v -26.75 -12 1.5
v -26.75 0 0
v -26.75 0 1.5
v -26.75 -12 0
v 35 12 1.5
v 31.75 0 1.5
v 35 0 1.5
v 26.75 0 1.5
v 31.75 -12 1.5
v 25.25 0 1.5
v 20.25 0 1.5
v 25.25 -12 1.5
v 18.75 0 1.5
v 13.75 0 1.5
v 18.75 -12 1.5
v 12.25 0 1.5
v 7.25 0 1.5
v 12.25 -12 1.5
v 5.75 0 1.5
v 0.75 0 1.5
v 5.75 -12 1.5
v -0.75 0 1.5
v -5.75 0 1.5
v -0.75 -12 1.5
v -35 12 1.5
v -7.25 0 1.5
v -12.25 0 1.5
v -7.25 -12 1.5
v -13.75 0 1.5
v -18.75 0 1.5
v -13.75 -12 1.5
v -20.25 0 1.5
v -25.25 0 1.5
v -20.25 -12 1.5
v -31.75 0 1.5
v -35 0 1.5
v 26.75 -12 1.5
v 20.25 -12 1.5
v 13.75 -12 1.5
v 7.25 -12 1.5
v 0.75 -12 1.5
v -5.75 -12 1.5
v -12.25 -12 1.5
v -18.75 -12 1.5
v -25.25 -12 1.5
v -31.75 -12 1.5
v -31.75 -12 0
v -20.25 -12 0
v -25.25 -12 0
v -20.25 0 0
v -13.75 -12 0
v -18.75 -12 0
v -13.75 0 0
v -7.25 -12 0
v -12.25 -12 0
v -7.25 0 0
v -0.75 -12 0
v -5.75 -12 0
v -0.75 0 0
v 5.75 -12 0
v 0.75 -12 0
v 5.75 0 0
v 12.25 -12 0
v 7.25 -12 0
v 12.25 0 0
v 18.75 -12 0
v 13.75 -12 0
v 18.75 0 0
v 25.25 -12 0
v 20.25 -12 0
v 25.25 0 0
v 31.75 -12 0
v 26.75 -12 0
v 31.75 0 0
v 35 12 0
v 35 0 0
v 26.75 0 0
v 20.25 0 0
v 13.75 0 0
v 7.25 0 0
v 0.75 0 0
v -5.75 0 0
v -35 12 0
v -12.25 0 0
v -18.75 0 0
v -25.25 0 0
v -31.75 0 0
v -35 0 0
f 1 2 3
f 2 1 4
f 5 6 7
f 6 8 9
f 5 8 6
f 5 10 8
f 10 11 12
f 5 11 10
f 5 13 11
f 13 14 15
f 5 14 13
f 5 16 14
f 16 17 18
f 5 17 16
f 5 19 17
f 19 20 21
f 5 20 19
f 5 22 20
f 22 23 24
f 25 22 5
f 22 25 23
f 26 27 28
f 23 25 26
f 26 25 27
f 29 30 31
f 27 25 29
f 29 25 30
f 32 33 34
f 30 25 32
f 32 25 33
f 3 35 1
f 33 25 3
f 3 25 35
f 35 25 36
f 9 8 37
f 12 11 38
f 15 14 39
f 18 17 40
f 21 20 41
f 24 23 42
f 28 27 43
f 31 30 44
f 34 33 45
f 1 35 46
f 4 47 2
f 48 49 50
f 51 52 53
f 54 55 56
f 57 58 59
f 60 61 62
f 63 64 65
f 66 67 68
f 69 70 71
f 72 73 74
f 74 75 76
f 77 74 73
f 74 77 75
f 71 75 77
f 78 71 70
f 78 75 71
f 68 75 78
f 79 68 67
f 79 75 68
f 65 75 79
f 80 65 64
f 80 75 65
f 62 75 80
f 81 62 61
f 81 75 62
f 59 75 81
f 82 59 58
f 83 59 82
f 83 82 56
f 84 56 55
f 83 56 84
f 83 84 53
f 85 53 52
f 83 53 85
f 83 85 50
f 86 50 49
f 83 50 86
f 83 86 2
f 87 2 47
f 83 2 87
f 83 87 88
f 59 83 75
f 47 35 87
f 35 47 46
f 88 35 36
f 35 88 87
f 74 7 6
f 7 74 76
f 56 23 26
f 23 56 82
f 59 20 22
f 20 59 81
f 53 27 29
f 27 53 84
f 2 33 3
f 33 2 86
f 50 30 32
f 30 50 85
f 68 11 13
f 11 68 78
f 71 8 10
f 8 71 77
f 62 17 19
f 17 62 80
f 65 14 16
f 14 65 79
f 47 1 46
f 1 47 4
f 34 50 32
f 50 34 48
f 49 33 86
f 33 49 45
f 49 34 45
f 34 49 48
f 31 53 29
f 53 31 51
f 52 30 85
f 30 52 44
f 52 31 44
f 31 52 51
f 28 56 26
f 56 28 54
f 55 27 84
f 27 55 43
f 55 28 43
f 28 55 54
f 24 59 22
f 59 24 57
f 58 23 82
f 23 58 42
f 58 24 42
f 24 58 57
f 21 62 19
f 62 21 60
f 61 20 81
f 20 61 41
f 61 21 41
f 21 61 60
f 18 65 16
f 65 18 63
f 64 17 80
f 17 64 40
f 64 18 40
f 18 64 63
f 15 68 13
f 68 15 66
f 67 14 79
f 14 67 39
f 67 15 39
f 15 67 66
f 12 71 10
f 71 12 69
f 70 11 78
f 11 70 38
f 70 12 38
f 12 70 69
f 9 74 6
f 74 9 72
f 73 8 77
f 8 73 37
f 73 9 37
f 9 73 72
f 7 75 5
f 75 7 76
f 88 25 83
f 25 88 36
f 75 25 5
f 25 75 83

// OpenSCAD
// 10-Well Agarose Gel Comb
// Designed for FDM printing, lying flat on the XY plane.

// --- Dimensions ---
plate_length = 70.0;       // X dimension of the spine
plate_width = 12.0;        // Y dimension of the spine
plate_thickness = 1.5;     // Z dimension (height of the plate)

num_teeth = 10;            // Number of teeth
tooth_width = 5.0;         // X dimension of each tooth
tooth_length = 12.0;       // Y dimension of each tooth (extending from spine)
gap_width = 1.5;           // Y dimension of the gap between teeth

// --- Derived Calculations ---
// Total width of the tooth array (from start of first tooth to end of last tooth)
// Total width = (num_teeth * tooth_width) + ((num_teeth - 1) * gap_width)
total_teeth_span = (num_teeth * tooth_width) + ((num_teeth - 1) * gap_width);

// --- Rendering Settings ---
$fn = 64;

// --- Geometry Construction ---

// The user wants a "comb for casting agarose gels".
// In a casting comb, the "teeth" are the solid parts that divide the wells.
// The "wells" are the gaps between the teeth.
// The "spine" is the base plate that holds the teeth.
// The prompt specifies: 
// 1. Spine is 70x12.
// 2. Teeth are 5x12 and hang from one long edge in the -Y direction.
// 3. The row of teeth is centered on the spine in X.

// To ensure the part is a single solid body and matches the bounding box requirements:
// The spine is at Y = [0, 12].
// The teeth hang from the edge at Y = 0, extending to Y = -12.
// Total Y span: -12 to 12 = 24mm.

union() {
    // 1. The Spine (Base Plate)
    // Centered on X and Y. 
    // To have the teeth hang from "one long edge" in -Y, 
    // and the spine to be 12mm wide, we place the spine from Y=0 to Y=12.
    // To center the whole assembly on Y=0, we shift the spine.
    // However, the prompt says "centered on the spine in X".
    // Let's center the spine on X and Y=6 (so the edge is at Y=0).
    // To keep the whole part centered on the origin (0,0) in XY:
    // Spine Y range: [0, 12] -> shifted by -6 -> [-6, 6]
    // Teeth Y range: [-12, 0] -> shifted by -6 -> [-18, -6]
    // Total Y range: [-18, 6] (Size 24).
    
    // Let's re-center the whole assembly so the bounding box is symmetric.
    // Total Y span = plate_width + tooth_length = 12 + 12 = 24.
    // Center of Y = 0. So Y goes from -12 to +12.
    // Spine is at Y = [0, 12]. Teeth are at Y = [-12, 0].
    
    translate([-plate_length/2, 0, 0])
        cube([plate_length, plate_width, plate_thickness]);

    // 2. The Teeth
    // The teeth are the solid parts.
    // They hang from the edge (Y=0) in the -Y direction.
    // They are 12mm long, so they occupy Y = [-12, 0].
    
    start_x = -total_teeth_span / 2;
    
    for (i = [0 : num_teeth - 1]) {
        // Calculate X position for this tooth
        current_x = start_x + (i * (tooth_width + gap_width));
        
        // Translate to the correct position
        // X: current_x
        // Y: -tooth_length (starts at 0 and goes to -12)
        // Z: 0
        translate([current_x, -tooth_length, 0])
            cube([tooth_width, tooth_length, plate_thickness]);
    }
}

// Final Centering Adjustment:
// The union above is not centered on Y. 
// The spine is [0, 12], teeth are [-12, 0]. Total Y is [-12, 12].
// This is perfectly centered on Y=0.
// The X span is [-35, 35] (70mm).
// The Y span is [-12, 12] (24mm).
// The Z span is [0, 1.5].
